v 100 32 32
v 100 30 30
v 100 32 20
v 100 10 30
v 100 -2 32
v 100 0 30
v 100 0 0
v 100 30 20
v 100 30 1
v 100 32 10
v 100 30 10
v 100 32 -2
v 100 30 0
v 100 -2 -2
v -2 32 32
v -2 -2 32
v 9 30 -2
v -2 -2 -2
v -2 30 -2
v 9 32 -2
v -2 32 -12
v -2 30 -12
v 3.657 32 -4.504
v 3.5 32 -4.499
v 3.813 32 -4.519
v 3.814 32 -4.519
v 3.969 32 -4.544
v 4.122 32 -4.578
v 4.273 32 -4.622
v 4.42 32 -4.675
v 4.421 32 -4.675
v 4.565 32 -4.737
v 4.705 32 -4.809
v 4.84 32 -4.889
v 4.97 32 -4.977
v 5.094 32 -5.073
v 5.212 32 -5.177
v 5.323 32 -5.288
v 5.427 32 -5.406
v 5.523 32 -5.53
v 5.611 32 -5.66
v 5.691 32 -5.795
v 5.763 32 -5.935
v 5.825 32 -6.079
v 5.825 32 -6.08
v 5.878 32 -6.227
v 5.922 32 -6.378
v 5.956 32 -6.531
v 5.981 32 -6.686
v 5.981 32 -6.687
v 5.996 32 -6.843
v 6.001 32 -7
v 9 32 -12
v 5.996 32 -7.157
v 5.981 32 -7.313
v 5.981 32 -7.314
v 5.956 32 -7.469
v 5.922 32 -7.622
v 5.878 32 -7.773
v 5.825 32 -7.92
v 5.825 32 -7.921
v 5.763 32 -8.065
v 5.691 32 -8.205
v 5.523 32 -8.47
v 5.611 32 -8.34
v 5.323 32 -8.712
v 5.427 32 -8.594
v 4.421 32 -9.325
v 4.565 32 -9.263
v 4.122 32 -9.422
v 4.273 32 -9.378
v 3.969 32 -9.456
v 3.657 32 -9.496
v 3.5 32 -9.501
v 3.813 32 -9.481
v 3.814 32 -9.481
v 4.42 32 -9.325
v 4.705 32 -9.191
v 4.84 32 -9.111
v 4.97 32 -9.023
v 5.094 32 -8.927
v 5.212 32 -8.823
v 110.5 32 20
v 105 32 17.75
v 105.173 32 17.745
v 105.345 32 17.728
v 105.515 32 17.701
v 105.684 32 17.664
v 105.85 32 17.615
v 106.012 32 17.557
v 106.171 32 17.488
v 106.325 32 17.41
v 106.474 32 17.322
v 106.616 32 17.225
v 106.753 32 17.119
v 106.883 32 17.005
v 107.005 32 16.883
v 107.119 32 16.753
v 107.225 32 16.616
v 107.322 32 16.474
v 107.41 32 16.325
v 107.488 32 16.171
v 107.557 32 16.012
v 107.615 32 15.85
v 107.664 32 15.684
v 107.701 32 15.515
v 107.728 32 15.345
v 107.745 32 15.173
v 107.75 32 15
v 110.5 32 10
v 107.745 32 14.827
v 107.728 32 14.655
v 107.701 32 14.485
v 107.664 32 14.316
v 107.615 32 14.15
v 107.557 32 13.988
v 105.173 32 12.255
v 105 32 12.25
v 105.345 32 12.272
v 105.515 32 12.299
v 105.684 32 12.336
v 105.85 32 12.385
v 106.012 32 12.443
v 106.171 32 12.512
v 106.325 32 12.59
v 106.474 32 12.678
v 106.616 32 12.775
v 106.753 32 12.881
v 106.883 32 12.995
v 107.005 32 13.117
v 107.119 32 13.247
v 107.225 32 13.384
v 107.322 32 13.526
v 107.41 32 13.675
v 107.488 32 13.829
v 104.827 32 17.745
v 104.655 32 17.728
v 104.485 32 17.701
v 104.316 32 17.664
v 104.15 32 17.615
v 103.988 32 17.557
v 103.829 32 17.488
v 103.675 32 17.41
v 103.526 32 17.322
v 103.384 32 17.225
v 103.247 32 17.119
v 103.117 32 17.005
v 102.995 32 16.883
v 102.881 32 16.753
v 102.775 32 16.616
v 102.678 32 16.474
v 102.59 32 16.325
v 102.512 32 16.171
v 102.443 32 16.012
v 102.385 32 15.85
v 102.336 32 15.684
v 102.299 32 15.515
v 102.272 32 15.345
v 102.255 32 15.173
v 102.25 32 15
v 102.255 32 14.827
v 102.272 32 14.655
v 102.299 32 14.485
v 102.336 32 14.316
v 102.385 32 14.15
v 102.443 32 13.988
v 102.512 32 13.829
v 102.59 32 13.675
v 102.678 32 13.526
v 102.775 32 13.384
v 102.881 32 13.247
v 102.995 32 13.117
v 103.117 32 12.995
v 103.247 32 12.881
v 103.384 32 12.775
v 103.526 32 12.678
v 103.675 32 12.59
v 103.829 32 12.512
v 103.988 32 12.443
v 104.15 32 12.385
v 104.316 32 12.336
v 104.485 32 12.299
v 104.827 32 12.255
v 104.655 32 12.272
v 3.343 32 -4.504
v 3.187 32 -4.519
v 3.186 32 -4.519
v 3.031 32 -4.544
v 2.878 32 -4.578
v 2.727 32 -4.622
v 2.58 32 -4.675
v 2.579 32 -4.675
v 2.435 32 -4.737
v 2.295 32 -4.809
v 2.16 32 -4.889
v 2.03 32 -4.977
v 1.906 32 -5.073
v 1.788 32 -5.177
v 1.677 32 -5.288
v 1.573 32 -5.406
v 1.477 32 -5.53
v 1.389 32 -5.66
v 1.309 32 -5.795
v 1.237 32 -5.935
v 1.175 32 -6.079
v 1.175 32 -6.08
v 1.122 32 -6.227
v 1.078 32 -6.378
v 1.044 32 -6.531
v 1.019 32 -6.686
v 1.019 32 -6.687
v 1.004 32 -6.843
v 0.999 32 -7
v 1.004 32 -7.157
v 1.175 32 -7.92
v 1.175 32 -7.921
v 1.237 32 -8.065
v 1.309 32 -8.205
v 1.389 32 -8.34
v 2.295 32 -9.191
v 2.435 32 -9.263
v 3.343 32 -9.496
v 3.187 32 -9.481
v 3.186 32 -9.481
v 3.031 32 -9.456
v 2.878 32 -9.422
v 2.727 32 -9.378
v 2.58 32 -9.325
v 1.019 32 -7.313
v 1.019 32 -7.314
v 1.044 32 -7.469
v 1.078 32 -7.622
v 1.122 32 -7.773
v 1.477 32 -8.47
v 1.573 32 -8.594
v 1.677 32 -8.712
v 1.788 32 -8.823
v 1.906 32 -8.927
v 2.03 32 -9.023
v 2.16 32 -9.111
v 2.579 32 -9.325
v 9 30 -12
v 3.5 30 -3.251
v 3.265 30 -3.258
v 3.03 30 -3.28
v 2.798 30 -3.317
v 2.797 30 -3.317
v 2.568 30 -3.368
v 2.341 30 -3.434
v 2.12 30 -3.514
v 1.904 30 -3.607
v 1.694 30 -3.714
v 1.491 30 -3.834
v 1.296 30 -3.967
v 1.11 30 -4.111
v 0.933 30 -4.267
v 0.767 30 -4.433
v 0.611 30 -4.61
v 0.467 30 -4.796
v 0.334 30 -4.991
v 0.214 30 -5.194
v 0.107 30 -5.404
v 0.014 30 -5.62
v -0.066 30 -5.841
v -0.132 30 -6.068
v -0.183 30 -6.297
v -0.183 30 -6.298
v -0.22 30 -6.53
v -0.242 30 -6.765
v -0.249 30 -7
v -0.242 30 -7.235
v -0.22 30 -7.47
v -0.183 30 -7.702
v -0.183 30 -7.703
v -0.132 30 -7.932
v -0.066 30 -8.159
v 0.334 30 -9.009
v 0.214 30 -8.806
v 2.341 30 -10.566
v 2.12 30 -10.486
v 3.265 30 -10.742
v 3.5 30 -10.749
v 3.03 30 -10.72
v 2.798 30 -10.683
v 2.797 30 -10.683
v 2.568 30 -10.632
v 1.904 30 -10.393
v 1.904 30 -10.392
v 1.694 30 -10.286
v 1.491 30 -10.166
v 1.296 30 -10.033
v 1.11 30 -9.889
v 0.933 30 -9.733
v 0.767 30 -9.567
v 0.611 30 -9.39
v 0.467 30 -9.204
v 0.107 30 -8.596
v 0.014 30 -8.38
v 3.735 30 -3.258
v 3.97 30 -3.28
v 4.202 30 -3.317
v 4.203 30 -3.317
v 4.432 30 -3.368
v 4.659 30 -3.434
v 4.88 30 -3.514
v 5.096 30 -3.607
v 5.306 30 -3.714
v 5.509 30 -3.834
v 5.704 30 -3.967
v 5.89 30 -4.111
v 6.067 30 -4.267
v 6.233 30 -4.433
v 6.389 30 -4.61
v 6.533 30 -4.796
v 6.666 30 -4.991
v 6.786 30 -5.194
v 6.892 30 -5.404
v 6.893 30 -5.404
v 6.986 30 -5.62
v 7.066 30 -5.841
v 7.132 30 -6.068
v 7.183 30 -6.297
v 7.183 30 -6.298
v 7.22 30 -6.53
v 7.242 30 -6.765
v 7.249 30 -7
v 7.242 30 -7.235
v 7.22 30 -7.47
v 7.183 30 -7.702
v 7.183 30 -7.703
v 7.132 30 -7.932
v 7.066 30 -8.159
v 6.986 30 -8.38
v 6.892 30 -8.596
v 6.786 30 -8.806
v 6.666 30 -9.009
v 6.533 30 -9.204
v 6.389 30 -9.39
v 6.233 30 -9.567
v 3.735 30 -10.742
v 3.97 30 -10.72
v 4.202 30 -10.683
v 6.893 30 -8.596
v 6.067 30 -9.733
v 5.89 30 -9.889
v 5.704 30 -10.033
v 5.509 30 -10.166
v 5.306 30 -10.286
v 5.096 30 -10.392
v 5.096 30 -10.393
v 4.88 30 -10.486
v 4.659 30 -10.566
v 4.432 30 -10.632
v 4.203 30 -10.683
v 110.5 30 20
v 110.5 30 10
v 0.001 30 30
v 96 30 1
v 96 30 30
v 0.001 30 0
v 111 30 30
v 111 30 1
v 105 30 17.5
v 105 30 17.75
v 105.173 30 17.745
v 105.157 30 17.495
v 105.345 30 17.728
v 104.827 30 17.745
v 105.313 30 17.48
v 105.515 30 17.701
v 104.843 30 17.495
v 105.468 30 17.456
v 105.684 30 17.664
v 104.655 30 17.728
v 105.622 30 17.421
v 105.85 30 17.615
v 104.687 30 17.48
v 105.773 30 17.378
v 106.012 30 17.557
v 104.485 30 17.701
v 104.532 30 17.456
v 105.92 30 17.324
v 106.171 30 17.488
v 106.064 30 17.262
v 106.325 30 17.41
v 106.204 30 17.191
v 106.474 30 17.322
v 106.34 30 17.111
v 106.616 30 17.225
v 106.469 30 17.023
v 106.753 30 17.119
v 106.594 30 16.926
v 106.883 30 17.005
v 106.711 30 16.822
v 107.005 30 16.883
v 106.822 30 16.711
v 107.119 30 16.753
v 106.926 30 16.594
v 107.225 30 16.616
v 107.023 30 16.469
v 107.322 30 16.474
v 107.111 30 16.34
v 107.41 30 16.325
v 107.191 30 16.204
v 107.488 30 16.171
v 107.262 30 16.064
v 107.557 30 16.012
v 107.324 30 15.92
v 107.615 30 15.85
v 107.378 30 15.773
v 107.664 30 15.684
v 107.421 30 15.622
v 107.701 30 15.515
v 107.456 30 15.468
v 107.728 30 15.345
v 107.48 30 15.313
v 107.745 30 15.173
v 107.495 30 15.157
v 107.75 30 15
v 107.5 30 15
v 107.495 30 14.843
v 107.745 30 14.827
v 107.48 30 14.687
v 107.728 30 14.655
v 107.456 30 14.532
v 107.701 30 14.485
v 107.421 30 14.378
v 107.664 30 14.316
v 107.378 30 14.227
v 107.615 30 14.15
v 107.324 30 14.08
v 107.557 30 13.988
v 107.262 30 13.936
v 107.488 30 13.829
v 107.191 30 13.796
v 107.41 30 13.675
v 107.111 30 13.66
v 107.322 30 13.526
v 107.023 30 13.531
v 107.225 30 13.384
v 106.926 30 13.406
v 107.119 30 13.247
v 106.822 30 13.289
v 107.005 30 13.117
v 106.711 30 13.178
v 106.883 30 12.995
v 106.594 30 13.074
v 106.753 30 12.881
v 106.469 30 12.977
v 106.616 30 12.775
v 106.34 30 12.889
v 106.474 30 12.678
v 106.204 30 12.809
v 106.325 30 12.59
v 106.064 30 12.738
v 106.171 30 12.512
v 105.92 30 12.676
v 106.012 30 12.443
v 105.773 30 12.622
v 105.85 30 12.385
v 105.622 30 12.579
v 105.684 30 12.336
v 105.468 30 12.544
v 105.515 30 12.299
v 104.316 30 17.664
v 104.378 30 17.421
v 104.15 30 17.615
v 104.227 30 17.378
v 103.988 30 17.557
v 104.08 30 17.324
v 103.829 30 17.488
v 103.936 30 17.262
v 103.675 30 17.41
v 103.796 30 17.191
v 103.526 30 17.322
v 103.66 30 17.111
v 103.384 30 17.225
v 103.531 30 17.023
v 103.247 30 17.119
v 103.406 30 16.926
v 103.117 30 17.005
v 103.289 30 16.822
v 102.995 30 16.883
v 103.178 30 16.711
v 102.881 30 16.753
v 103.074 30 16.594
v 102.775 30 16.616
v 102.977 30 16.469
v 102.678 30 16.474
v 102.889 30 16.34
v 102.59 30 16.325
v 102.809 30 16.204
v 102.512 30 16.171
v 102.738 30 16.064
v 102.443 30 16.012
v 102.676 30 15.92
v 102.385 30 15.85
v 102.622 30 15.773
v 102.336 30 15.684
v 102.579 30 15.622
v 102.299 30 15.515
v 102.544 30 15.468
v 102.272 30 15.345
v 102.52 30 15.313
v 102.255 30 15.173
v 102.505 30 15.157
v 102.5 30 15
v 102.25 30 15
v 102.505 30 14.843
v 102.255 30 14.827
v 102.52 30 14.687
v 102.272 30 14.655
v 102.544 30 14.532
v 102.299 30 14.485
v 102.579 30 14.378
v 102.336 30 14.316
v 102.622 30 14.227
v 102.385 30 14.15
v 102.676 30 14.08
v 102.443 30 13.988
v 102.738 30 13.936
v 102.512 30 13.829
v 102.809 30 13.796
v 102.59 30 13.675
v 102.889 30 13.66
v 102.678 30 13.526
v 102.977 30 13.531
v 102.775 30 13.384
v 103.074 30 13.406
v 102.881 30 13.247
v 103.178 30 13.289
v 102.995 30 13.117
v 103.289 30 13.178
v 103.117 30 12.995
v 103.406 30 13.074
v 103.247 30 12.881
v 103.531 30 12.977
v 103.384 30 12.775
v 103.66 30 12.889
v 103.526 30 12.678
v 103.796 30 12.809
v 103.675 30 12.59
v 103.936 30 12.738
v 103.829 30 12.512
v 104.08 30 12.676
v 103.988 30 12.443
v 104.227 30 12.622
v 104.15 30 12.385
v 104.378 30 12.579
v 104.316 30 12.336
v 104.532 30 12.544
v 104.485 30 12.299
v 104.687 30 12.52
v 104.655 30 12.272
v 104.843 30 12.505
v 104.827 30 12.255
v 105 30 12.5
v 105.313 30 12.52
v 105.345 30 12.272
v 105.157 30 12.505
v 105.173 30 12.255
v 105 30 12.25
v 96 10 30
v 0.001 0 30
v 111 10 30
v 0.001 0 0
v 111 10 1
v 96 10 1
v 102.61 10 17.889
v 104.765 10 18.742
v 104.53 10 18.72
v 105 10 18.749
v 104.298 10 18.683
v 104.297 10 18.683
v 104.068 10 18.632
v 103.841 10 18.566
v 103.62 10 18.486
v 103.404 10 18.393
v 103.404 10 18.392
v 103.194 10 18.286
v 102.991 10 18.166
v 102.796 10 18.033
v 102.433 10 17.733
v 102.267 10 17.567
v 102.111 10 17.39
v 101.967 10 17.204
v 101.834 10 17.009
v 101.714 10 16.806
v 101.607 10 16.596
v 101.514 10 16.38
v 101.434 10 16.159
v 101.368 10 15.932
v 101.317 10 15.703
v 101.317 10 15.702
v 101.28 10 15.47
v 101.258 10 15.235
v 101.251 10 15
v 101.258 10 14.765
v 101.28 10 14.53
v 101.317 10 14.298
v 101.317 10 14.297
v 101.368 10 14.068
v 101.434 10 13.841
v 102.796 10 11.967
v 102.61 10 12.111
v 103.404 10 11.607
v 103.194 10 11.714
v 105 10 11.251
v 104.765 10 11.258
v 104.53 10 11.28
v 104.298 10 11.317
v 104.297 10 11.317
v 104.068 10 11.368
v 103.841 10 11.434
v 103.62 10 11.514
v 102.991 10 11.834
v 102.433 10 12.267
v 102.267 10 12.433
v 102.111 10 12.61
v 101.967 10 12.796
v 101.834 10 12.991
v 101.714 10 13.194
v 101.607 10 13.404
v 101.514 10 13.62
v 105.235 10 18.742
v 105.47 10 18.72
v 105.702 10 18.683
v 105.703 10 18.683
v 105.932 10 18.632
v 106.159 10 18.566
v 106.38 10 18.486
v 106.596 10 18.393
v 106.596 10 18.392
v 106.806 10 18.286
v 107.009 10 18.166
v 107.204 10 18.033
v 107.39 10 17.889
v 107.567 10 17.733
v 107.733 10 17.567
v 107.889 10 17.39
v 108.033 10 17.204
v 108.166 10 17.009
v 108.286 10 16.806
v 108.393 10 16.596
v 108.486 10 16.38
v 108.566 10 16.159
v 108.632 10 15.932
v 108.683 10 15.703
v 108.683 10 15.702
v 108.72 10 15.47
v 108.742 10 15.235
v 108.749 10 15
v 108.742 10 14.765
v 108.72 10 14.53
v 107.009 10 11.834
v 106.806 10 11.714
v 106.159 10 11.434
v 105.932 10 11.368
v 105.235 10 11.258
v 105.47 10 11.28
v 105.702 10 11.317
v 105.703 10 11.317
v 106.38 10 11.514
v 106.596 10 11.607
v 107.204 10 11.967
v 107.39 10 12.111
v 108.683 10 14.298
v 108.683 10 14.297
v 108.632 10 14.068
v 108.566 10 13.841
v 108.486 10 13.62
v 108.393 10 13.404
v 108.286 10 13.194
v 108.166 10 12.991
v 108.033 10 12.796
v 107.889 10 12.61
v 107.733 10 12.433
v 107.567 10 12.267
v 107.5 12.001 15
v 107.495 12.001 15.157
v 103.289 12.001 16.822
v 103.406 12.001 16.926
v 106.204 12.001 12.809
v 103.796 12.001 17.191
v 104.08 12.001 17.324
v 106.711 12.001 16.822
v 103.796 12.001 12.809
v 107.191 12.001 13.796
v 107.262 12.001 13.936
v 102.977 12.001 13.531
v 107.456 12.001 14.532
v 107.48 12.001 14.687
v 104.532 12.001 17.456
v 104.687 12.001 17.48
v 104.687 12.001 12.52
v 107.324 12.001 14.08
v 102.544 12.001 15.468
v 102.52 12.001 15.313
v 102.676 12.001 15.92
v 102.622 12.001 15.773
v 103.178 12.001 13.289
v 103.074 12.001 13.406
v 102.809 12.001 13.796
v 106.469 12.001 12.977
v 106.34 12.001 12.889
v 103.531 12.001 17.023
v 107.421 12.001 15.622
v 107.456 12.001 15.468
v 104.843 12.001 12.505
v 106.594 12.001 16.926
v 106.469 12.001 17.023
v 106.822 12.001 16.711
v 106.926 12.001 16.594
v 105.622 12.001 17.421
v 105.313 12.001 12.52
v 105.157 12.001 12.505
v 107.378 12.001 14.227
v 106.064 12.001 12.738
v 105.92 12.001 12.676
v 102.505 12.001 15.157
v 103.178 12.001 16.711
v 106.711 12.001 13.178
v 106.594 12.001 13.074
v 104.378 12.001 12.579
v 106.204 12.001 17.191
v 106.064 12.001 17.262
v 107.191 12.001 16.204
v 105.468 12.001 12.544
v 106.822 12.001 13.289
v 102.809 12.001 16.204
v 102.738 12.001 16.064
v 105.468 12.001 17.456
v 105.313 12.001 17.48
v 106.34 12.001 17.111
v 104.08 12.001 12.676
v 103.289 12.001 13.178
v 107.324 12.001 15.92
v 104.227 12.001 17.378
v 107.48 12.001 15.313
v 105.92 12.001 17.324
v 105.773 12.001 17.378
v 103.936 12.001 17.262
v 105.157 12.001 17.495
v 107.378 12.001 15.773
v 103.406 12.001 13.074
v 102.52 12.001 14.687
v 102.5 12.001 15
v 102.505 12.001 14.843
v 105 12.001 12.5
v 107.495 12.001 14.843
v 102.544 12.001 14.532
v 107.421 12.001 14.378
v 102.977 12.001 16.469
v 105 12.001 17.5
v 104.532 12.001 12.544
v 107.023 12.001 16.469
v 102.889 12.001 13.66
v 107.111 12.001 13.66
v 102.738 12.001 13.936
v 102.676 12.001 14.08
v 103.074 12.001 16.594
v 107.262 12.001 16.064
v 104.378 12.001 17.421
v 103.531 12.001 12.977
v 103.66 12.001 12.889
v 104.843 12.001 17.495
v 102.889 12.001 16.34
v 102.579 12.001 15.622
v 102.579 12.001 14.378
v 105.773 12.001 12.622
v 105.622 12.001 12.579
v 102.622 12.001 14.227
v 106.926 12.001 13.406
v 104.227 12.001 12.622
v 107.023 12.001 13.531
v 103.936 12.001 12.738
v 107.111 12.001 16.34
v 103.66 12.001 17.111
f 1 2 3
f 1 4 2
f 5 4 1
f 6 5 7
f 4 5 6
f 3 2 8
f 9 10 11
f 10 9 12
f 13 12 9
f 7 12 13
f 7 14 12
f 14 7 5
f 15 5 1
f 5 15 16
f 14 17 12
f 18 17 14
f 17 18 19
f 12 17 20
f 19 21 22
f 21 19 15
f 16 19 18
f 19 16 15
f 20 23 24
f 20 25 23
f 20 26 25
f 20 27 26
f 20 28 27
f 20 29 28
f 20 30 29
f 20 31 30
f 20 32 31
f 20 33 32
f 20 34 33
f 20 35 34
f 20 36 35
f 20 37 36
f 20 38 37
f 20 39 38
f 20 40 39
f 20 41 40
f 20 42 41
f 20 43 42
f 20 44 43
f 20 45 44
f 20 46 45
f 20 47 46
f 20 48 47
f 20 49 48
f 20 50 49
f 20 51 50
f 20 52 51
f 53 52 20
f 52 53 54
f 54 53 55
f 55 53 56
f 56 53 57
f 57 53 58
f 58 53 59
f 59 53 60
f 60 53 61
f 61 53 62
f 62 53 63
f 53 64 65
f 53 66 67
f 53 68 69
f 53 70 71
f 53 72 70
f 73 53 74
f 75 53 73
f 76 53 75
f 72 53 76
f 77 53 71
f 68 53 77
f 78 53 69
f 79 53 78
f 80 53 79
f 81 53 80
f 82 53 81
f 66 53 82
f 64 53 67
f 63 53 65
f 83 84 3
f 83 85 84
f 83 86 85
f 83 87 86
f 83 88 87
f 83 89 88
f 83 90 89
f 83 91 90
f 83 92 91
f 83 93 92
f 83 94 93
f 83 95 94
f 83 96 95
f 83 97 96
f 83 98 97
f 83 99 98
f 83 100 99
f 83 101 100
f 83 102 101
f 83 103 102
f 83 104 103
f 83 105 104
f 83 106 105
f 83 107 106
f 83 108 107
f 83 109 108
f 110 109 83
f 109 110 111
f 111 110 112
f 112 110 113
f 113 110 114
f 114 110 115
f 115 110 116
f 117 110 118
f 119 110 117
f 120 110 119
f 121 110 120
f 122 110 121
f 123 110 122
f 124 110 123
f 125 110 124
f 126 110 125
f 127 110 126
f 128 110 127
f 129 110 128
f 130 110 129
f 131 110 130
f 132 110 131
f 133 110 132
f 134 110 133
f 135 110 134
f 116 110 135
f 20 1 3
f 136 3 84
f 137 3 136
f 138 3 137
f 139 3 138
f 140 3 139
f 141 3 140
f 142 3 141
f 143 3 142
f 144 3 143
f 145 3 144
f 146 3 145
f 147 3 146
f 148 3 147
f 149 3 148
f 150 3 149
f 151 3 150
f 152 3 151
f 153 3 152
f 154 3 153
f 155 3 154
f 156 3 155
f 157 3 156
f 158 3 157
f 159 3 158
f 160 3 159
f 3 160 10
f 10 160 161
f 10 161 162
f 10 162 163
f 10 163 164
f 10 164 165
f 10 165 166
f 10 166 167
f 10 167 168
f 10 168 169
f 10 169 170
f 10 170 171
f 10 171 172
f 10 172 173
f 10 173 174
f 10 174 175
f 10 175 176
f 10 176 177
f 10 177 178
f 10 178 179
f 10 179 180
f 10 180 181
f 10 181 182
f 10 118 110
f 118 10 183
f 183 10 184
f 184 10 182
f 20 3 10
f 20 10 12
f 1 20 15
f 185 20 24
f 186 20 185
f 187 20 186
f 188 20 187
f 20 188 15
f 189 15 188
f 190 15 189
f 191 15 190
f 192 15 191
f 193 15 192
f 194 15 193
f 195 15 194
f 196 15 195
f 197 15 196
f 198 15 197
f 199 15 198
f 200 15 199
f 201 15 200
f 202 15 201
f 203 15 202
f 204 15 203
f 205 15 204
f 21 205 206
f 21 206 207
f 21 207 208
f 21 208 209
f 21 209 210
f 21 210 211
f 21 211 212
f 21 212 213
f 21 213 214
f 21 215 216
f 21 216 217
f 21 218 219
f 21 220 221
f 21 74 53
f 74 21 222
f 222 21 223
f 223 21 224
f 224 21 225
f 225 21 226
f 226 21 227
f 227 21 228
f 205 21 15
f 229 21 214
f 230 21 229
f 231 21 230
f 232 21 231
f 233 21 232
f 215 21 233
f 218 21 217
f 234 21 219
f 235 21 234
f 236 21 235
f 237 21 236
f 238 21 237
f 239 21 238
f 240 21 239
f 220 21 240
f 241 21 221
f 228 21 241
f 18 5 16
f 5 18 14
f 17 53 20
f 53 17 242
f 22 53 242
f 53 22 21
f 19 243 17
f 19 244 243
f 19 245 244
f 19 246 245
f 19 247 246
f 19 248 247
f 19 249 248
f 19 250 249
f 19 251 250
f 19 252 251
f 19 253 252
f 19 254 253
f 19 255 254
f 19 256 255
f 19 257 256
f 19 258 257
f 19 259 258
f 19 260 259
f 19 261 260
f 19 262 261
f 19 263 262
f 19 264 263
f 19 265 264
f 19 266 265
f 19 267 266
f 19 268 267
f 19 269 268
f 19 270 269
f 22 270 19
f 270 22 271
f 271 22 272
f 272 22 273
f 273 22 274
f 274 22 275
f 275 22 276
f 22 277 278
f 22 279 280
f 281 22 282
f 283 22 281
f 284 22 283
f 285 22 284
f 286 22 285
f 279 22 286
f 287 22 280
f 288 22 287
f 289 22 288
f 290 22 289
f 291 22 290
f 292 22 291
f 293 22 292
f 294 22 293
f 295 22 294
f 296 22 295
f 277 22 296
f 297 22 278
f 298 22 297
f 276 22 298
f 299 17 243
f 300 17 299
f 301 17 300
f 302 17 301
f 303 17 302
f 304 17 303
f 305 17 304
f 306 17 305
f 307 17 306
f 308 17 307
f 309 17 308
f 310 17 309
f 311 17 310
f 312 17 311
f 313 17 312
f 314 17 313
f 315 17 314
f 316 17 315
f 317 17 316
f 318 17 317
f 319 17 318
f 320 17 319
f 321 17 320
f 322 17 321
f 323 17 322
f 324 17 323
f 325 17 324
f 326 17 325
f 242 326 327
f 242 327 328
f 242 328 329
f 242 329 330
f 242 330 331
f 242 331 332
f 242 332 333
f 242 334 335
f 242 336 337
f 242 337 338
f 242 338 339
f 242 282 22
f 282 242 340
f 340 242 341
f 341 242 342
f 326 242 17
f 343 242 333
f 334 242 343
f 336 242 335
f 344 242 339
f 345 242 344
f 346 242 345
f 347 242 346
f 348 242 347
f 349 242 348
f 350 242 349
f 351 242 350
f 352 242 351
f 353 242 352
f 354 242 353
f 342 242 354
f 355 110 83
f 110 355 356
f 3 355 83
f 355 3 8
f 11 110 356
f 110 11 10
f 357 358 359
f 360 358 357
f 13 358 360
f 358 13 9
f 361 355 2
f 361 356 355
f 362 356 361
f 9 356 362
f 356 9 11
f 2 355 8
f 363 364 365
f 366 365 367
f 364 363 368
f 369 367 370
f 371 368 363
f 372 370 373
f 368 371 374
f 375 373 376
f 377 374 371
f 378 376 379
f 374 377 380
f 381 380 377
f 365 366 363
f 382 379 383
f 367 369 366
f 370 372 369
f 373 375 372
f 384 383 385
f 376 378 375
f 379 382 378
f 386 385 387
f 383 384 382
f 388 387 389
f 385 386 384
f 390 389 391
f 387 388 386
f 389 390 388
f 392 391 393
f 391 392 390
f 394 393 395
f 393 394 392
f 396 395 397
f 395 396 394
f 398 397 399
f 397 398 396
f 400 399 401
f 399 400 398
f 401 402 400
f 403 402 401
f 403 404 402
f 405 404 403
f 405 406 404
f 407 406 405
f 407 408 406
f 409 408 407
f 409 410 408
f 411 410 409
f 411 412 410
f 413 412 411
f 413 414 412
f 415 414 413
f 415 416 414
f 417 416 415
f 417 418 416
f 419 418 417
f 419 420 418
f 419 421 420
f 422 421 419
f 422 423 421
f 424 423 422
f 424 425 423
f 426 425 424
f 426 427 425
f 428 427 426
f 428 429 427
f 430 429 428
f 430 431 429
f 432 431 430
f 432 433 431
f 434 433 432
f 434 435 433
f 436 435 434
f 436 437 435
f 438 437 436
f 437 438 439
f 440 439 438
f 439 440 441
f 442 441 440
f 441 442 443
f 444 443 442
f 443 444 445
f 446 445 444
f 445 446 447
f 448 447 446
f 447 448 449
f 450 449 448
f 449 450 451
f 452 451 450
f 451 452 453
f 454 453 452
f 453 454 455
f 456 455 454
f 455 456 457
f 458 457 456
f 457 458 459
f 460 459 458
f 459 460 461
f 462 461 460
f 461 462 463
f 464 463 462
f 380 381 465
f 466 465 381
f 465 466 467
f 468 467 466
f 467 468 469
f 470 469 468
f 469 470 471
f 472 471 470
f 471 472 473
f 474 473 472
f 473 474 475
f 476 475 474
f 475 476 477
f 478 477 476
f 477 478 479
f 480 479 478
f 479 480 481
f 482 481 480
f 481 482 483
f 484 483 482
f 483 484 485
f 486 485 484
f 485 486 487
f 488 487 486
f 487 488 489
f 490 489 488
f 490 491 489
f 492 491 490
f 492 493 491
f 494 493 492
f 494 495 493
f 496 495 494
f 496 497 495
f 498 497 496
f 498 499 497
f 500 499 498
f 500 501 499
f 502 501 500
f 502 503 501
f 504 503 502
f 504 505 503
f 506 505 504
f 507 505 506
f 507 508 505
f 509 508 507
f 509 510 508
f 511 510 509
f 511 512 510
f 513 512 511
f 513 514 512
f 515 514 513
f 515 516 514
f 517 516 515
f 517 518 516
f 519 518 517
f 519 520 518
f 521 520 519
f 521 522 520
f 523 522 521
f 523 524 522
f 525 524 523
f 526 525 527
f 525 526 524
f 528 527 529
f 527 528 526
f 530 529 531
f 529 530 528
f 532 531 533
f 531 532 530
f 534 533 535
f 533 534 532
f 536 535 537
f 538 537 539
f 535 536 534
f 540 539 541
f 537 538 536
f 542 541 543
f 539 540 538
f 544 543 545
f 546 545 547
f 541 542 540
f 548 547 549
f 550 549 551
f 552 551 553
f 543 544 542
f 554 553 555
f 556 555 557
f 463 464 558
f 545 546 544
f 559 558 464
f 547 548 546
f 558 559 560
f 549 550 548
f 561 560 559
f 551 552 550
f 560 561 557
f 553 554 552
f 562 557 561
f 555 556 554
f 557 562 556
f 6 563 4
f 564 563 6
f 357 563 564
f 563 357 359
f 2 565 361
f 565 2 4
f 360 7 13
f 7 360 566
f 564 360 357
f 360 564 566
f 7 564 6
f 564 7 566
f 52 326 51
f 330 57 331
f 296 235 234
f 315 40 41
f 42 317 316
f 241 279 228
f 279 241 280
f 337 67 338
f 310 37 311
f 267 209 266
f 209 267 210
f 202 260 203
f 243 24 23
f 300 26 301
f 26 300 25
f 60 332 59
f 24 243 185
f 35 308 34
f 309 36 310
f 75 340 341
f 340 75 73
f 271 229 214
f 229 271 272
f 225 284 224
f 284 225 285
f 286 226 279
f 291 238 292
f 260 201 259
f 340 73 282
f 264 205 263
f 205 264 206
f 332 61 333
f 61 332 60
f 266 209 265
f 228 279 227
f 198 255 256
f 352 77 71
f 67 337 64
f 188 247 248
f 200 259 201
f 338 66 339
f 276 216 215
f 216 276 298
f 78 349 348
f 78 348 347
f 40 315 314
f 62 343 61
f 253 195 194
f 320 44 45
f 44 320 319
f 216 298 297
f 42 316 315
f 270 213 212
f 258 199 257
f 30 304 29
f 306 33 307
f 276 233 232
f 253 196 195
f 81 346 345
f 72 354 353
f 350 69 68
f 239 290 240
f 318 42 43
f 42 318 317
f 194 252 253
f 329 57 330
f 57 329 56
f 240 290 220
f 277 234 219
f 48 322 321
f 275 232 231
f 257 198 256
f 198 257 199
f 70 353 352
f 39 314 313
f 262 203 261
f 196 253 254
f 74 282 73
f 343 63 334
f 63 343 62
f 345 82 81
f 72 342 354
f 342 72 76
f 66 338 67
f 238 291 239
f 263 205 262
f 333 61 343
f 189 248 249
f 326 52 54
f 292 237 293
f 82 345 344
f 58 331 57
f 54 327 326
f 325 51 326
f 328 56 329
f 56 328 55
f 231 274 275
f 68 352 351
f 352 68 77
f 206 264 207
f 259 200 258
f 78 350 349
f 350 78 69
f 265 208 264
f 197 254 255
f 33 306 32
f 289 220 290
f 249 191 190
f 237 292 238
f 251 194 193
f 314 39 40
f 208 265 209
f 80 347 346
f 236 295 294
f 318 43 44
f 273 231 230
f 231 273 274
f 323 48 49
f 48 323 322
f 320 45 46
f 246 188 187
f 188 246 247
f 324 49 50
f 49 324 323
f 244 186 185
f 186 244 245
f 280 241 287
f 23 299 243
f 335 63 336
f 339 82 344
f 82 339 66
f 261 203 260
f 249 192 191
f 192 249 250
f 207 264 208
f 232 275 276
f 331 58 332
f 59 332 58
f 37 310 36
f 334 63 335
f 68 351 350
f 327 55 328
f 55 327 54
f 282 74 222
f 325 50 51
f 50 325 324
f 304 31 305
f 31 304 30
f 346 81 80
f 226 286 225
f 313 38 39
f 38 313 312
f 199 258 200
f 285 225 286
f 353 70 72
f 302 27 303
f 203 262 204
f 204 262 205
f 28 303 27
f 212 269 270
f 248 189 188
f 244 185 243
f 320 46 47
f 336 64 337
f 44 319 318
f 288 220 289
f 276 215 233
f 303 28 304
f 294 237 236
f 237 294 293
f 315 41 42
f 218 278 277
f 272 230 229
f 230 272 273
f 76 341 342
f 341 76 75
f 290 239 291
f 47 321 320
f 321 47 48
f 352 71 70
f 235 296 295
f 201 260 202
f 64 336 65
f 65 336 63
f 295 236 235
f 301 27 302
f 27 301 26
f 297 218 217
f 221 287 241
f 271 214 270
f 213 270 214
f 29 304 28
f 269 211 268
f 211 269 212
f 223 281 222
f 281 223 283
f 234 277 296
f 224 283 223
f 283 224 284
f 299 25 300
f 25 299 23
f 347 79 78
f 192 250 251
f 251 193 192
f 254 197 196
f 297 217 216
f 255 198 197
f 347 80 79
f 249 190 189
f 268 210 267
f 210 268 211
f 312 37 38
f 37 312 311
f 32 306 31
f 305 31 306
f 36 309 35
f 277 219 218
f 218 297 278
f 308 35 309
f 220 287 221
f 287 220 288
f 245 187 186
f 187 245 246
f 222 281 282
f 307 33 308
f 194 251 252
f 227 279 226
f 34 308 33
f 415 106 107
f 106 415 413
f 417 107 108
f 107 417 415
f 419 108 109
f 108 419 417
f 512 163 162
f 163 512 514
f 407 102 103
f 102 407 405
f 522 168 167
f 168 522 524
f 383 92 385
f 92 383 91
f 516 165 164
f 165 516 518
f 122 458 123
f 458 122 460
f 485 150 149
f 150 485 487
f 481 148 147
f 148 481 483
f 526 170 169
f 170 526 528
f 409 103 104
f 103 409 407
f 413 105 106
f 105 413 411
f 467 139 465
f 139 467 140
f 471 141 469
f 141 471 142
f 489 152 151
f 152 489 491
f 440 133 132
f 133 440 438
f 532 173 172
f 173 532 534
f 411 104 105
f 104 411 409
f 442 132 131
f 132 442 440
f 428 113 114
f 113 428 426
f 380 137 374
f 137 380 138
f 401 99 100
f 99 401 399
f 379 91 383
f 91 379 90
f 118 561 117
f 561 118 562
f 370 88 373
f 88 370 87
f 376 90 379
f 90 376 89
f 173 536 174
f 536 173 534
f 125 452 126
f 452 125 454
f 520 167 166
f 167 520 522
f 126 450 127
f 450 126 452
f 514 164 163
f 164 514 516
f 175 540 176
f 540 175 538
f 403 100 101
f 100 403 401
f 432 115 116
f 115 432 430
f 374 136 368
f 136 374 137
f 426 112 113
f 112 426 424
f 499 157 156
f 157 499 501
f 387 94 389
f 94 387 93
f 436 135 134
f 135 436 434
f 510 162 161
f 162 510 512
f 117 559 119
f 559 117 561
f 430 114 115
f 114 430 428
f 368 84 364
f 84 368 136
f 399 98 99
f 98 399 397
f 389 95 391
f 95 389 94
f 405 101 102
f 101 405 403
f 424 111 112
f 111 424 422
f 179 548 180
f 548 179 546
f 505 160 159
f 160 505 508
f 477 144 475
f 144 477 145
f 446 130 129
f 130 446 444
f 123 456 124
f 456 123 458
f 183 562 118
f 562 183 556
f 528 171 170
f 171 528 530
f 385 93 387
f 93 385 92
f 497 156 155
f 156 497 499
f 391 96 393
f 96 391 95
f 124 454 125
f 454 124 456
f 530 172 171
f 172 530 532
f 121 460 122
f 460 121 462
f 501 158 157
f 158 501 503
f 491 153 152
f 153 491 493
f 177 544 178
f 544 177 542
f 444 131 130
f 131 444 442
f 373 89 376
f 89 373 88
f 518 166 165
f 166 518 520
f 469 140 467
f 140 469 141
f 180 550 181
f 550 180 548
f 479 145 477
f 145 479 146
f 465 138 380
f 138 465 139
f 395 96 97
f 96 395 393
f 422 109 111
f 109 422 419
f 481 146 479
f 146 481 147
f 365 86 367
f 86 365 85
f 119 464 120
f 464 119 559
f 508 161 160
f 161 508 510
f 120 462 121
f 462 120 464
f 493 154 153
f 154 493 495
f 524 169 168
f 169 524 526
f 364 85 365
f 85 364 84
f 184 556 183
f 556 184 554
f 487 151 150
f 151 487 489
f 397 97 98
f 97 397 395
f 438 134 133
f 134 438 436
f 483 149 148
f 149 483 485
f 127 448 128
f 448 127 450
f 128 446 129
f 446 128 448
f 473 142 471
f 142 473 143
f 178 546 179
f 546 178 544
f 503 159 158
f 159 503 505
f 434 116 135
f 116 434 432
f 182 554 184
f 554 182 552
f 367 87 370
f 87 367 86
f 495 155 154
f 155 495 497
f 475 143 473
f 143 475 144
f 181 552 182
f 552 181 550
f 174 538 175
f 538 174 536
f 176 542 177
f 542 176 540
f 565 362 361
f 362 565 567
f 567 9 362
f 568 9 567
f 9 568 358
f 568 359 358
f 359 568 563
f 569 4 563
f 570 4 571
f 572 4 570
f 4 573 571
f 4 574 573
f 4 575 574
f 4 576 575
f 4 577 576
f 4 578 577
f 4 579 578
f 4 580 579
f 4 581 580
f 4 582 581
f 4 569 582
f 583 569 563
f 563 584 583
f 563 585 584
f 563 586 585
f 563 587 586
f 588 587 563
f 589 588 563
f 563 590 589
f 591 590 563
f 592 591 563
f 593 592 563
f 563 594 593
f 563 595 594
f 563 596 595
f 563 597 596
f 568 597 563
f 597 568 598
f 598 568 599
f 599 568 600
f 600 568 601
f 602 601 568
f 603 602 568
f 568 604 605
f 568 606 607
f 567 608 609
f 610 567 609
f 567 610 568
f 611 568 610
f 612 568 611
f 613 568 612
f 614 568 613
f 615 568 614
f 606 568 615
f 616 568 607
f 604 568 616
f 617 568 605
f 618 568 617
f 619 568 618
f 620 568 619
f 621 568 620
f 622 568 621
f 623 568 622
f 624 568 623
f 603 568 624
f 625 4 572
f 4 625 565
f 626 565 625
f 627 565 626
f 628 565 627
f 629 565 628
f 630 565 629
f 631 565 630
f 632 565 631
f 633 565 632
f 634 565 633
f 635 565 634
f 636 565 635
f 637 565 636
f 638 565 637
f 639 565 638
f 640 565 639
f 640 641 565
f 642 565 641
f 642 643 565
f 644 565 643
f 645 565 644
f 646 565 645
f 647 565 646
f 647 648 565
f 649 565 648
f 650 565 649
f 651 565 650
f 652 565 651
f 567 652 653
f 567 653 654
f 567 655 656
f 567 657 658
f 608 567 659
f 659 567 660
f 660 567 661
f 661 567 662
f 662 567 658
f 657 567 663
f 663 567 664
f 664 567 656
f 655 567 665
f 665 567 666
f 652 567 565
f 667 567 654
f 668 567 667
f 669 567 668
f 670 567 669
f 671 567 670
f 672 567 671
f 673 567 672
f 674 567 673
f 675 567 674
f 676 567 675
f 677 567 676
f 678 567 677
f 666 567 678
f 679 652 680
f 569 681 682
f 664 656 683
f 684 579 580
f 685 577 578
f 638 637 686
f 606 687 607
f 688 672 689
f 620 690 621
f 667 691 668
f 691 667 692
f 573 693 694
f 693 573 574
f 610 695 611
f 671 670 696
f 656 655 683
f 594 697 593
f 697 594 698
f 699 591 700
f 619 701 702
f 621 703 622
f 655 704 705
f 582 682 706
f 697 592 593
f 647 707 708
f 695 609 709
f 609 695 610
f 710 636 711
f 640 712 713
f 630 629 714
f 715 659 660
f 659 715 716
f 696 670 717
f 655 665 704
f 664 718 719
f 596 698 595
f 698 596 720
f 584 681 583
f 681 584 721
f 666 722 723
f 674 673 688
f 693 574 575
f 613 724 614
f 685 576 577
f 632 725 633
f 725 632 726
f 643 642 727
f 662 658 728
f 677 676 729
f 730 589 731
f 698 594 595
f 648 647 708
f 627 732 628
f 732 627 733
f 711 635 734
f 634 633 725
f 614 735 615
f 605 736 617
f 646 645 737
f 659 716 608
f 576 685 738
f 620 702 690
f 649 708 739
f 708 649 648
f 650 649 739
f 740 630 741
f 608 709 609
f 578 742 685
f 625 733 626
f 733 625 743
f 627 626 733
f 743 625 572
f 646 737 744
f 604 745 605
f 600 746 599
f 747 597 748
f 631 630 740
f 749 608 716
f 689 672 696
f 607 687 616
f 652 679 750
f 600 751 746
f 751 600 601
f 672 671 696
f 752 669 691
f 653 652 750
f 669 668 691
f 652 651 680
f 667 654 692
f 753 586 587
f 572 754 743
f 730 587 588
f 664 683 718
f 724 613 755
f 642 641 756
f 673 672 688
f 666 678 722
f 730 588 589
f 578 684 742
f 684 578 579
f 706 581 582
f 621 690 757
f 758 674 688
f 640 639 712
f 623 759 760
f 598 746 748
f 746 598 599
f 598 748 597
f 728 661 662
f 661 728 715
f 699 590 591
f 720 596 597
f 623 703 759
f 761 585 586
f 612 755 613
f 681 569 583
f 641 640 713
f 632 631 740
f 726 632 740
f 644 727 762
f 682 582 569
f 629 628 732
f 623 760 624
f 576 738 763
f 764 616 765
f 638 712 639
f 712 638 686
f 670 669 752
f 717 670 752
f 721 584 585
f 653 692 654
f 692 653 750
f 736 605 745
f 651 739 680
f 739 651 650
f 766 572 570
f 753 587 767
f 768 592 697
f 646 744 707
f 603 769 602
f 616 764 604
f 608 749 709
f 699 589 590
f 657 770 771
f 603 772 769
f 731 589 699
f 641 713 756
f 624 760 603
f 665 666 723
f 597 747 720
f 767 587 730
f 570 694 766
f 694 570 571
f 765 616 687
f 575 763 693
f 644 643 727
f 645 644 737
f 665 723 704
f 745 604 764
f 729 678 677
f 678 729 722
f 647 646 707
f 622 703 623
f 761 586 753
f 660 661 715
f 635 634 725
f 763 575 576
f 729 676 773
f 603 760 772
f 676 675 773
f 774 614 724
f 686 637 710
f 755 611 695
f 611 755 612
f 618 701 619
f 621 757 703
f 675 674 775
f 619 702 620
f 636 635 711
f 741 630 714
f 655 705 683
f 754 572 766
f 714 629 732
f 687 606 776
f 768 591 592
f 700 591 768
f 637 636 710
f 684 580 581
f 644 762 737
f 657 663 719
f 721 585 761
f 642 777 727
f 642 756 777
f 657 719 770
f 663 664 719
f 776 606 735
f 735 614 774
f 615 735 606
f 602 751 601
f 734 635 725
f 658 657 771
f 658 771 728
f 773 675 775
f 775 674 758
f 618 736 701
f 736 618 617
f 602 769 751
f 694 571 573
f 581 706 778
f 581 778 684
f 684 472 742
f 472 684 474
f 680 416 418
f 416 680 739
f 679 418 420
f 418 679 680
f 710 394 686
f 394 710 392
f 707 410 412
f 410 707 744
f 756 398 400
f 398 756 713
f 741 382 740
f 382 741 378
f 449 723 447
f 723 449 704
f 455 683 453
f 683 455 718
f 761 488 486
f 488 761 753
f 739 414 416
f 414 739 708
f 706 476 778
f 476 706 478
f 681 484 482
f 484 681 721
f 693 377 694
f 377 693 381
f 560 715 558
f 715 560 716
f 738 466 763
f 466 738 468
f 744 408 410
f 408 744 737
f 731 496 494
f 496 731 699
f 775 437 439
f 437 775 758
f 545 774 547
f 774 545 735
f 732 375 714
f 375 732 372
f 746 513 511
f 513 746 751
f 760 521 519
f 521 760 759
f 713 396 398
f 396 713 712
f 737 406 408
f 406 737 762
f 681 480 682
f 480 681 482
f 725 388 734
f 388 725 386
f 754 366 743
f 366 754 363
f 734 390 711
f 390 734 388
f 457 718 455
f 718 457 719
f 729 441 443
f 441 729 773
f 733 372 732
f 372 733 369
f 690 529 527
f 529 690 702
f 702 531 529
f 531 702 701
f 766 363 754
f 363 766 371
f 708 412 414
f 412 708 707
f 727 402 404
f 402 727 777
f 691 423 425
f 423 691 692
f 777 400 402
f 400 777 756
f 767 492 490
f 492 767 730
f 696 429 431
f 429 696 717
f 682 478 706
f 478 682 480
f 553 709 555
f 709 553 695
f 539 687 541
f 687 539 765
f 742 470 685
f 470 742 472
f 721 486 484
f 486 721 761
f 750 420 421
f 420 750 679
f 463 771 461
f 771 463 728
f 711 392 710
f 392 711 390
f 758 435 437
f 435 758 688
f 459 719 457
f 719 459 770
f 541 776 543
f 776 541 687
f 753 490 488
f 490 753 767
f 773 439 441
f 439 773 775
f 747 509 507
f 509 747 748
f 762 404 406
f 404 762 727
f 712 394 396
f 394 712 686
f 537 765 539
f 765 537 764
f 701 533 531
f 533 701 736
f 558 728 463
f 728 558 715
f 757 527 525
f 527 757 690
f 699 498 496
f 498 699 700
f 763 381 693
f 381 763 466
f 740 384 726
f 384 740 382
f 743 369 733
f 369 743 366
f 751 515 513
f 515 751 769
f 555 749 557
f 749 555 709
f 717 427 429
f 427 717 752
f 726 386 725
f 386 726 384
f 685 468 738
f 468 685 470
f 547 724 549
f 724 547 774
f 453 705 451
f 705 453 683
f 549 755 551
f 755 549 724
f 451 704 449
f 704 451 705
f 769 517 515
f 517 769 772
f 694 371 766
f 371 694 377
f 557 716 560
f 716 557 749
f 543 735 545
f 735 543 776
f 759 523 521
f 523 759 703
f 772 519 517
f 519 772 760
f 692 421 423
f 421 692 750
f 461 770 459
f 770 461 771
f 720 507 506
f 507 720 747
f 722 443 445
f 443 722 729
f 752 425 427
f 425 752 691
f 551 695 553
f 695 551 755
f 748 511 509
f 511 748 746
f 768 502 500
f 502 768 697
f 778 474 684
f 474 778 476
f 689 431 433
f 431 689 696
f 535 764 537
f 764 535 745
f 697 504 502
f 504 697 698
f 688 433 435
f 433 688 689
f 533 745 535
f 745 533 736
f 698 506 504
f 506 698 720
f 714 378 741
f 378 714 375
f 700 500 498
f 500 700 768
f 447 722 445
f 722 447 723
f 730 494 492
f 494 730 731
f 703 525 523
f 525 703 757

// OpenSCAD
//
// ktBOX6
//
//


gap1 = 0.001;
gap2 = 0.002;

panel_thick = 2;

X = 100;
Y = 30;
Z = 30;



translate([0, 0, 0]) A();
translate([0, 0, 0]) B();

module A()
{
difference()
{
    union()
    {
        translate([-panel_thick, -panel_thick, -panel_thick]) cube([X+panel_thick, Y+panel_thick*2, Z+panel_thick*2]);
        translate([-panel_thick, Y, -12]) cube([11, panel_thick, 10]);
        translate([X-0.5, Y, (Z/2)-5]) cube([11, panel_thick, 10]);
    }
    translate([gap1, 0, 0]) cube([X, Y, Z]);
    translate([3.5, Y+panel_thick+gap1, -7]) rotate([90, 0, 0]) cylinder( panel_thick+gap2, d1=5, d2=7.5, $fn=100);
    translate([X+5, Y+panel_thick+gap1, Z/2]) rotate([90, 0, 0]) cylinder( panel_thick+gap2, d1=5.5, d2=5.5, $fn=100);
}
}

module B()
{
difference()
{
    union()
    {
        translate([X-4, Y-(Y-10), 1]) cube([15, Y-10, Z-1]);
    }
    translate([X+5, Y-(Y-10)+panel_thick+gap1, Z/2]) rotate([90, 0, 0]) cylinder( panel_thick+gap2, d1=5, d2=7.5, $fn=100);
    translate([X+5, Y-(Y-10)+panel_thick+gap1+40, Z/2]) rotate([90, 0, 0]) cylinder( 50, d1=5, d2=5, $fn=100);
}
}
